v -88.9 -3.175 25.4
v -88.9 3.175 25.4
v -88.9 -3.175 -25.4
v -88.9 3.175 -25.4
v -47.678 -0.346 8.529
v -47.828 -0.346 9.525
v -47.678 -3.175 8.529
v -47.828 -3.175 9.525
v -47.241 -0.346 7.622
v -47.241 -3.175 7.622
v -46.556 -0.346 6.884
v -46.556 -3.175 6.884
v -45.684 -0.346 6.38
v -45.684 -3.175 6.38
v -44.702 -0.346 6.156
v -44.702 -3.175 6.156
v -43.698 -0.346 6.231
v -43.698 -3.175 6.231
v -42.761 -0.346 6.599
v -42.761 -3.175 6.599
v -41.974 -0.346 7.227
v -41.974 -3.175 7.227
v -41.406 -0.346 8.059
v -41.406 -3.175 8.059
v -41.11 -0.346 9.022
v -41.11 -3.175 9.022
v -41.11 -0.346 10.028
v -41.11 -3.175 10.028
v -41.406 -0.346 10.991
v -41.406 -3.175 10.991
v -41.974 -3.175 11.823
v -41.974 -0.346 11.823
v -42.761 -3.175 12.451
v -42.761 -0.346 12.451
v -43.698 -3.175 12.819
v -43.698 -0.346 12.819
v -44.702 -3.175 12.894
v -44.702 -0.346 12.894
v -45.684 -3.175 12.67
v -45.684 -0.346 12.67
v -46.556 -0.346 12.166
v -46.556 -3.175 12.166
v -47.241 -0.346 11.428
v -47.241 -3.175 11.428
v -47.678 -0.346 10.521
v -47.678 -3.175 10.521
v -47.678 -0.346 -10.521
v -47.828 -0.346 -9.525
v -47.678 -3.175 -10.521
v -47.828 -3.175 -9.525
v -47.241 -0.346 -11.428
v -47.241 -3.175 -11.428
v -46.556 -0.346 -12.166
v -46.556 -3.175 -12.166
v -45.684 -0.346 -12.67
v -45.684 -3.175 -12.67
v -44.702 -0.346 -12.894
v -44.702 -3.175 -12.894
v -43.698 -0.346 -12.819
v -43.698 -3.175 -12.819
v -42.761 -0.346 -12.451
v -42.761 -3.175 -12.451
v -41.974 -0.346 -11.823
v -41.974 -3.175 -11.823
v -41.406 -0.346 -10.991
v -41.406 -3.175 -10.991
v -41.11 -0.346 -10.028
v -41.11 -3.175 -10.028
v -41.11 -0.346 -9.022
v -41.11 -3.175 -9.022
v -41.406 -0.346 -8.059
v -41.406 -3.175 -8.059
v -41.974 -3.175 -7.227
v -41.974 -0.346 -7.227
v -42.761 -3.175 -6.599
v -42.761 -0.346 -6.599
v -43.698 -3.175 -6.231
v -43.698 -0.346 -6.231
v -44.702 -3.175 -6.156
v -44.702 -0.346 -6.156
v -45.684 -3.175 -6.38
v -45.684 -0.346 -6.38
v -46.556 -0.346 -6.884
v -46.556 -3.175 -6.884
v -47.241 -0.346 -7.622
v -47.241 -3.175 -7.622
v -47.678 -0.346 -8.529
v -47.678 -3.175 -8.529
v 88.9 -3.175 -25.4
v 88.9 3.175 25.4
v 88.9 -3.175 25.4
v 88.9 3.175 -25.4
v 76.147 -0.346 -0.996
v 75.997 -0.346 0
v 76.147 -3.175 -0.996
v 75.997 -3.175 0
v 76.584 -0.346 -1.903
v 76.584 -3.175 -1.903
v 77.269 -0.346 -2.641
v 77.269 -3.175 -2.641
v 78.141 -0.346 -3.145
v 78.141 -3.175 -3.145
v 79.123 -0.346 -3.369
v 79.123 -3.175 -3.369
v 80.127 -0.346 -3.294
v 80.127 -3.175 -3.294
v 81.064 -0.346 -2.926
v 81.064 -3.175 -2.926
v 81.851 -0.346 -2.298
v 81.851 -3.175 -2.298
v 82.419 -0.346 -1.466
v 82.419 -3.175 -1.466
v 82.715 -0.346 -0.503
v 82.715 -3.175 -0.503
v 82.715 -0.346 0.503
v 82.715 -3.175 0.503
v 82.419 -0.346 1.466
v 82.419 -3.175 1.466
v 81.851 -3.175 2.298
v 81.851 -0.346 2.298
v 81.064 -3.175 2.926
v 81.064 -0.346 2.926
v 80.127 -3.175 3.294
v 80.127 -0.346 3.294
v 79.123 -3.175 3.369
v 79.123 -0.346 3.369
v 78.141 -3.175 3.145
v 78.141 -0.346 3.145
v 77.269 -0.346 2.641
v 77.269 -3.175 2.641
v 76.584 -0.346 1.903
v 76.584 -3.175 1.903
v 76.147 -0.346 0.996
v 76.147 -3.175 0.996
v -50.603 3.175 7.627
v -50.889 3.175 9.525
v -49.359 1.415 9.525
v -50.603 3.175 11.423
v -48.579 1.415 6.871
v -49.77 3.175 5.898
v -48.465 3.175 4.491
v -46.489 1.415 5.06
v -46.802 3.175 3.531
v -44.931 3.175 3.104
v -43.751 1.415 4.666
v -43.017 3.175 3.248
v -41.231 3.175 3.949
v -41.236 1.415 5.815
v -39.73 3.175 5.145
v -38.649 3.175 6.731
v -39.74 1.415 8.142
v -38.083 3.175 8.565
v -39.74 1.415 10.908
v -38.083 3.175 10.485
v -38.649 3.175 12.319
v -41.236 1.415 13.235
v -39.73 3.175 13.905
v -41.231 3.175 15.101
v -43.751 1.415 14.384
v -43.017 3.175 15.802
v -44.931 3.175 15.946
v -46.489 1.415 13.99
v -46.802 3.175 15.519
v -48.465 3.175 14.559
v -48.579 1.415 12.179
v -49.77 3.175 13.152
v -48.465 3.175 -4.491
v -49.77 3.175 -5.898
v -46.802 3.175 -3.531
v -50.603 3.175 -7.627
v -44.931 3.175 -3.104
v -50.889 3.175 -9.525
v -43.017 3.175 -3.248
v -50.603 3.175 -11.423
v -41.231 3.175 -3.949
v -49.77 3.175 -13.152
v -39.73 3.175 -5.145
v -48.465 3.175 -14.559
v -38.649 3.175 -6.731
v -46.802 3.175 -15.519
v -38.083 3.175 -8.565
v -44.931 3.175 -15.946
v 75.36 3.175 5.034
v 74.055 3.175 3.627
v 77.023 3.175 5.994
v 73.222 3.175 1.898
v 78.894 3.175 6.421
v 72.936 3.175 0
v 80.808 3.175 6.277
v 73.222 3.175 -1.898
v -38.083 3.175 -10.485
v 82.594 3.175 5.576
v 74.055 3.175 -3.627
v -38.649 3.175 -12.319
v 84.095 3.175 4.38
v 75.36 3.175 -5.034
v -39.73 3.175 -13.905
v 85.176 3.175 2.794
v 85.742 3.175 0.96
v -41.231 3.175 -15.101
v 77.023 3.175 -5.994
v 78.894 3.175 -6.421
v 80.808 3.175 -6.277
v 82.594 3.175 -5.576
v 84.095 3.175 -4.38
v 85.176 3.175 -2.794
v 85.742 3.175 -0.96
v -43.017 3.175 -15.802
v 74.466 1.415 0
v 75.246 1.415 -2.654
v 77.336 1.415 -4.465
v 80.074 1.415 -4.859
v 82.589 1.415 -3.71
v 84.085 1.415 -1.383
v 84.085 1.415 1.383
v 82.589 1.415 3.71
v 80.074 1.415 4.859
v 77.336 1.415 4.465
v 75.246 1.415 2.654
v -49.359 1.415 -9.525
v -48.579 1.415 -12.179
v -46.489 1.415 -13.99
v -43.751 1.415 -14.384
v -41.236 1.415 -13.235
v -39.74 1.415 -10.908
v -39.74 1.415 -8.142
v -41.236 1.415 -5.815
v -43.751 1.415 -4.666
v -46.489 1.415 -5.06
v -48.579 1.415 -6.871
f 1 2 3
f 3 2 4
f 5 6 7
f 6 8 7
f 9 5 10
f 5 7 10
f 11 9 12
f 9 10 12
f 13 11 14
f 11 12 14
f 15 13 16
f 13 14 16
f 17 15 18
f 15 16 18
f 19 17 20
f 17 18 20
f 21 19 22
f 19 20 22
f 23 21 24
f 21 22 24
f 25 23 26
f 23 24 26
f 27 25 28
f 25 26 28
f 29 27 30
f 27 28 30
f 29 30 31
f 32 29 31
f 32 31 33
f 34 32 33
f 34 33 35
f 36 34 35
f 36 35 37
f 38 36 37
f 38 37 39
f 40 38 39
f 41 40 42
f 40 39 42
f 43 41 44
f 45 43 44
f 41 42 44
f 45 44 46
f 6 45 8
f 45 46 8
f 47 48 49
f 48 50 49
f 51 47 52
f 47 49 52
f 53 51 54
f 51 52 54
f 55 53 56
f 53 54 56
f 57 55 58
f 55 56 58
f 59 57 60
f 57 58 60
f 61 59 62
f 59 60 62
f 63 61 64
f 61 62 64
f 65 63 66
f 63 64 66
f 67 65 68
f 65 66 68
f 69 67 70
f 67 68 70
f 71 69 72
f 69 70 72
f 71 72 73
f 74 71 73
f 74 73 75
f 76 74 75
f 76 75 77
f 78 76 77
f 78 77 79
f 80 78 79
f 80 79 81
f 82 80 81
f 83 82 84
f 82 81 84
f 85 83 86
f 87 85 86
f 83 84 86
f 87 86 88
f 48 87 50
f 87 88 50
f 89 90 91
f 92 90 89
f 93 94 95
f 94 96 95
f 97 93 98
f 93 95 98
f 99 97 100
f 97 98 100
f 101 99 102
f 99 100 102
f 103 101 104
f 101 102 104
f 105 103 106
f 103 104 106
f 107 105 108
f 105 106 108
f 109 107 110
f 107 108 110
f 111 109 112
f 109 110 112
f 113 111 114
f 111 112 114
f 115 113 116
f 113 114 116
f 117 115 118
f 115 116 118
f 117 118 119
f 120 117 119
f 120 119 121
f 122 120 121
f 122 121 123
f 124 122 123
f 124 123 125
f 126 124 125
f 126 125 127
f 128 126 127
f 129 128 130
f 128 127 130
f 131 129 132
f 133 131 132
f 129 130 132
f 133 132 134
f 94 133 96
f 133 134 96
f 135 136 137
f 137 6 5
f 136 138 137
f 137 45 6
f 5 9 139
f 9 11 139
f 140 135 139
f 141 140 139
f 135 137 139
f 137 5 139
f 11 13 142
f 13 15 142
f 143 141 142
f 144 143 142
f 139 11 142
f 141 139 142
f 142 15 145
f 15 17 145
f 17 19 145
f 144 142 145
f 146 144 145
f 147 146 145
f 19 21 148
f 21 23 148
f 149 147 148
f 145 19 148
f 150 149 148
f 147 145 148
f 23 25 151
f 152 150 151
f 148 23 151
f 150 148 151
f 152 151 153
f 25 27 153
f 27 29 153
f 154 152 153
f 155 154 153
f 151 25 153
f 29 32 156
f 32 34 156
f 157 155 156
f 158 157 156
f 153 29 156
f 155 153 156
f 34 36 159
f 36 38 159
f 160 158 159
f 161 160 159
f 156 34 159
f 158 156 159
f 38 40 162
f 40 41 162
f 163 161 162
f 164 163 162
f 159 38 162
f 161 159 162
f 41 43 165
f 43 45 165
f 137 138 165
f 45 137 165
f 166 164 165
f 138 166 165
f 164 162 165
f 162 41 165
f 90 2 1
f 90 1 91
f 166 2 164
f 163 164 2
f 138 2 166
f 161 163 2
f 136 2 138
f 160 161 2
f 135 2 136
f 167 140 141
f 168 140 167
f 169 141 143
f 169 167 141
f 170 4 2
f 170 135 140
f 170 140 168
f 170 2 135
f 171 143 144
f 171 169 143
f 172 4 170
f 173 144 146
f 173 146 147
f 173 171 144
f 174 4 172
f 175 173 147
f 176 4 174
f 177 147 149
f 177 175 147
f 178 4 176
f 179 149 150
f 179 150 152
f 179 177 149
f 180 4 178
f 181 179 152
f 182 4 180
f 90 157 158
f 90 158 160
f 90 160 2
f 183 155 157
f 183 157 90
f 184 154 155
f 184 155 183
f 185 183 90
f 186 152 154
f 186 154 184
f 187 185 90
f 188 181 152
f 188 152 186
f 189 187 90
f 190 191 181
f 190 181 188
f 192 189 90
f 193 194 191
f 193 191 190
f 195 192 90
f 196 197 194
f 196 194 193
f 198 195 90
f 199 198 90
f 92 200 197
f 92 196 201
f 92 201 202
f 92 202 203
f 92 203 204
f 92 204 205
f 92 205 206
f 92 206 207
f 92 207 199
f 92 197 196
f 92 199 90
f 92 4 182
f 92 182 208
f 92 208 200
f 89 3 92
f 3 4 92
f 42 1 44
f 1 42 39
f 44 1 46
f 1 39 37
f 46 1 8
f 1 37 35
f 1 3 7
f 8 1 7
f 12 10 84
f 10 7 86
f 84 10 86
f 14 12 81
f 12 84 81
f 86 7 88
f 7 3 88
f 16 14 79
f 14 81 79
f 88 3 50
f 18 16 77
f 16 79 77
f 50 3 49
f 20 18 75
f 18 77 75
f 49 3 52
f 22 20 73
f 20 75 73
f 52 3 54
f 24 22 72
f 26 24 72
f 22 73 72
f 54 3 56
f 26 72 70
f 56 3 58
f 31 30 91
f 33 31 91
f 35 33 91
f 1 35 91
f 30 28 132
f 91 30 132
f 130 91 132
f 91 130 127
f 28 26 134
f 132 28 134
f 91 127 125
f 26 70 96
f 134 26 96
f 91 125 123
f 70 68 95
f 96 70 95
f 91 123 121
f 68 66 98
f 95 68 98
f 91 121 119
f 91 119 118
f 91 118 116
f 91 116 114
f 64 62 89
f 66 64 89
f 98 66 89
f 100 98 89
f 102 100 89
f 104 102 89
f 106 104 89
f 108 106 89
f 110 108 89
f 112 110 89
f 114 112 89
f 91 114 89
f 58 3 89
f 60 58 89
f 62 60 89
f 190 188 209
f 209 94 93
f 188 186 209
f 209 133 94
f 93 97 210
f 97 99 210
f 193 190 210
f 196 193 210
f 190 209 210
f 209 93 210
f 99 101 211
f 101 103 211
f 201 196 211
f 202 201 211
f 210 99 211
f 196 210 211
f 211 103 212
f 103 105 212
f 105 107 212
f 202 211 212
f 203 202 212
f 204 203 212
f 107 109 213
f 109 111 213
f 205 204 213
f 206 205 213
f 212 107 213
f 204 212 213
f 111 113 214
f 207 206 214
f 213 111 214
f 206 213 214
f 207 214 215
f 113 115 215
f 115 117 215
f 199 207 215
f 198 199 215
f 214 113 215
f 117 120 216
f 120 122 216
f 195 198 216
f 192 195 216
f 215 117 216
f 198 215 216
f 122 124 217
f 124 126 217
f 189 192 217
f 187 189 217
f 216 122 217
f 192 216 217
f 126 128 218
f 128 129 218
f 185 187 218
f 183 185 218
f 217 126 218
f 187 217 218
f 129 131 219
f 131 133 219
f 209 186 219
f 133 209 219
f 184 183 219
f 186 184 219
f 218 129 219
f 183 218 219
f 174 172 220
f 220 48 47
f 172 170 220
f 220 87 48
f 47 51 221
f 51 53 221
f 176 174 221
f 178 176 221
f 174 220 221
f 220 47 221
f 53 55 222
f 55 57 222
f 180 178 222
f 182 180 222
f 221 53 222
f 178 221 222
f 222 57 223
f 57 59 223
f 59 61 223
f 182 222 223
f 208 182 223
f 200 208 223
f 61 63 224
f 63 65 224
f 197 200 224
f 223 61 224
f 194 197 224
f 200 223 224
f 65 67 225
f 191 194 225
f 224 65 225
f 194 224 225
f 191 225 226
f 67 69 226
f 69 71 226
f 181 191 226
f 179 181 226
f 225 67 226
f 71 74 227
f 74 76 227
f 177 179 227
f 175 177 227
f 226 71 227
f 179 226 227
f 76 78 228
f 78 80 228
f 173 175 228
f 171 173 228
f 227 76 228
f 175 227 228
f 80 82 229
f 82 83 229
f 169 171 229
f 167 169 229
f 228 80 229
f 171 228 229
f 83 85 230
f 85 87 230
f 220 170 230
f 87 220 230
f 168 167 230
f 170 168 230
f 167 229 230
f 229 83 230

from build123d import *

# Parameters (mm, degrees)
SKETCH1_W                                        = 177.8
SKETCH1_H                                        = 50.8
BOSS_EXTRUDE1_DEPTH                              = 3.175
CSK_FOR_1_4_FLAT_HEAD_MACHINE_SCREW1_D           = 6.7564
CSK_FOR_1_4_FLAT_HEAD_MACHINE_SCREW1_DEPTH       = 19.05
CSK_FOR_1_4_FLAT_HEAD_MACHINE_SCREW1_CSINK_D     = 12.8778
CSK_FOR_1_4_FLAT_HEAD_MACHINE_SCREW1_CSINK_ANGLE = 82
CSK_FOR_1_4_FLAT_HEAD_MACHINE_SCREW1_TIP         = 2.029827343


with BuildPart() as part:
    # Sketch1 → Boss-Extrude1 (new, symmetric)
    with BuildSketch(Plane(origin=(0, 0, 0), x_dir=(1, 0, 0), z_dir=(0, 1, 0))):
        Rectangle(SKETCH1_W, SKETCH1_H)
    extrude(amount=BOSS_EXTRUDE1_DEPTH, both=True)

    # CSK for 1/4 Flat Head Machine Screw1
    with Locations(Plane(origin=(0, 3.175, 0), x_dir=(1, 0, 0), z_dir=(0, 1, 0))):
        with Locations((79.375, 0), (-44.45, 9.525), (-44.45, -9.525)):
            CounterSinkHole(CSK_FOR_1_4_FLAT_HEAD_MACHINE_SCREW1_D / 2, CSK_FOR_1_4_FLAT_HEAD_MACHINE_SCREW1_CSINK_D / 2, depth=CSK_FOR_1_4_FLAT_HEAD_MACHINE_SCREW1_DEPTH, counter_sink_angle=CSK_FOR_1_4_FLAT_HEAD_MACHINE_SCREW1_CSINK_ANGLE)
            with Locations((0, 0, -(CSK_FOR_1_4_FLAT_HEAD_MACHINE_SCREW1_DEPTH + CSK_FOR_1_4_FLAT_HEAD_MACHINE_SCREW1_TIP / 2))):  # 118° drill point
                Cone(0, CSK_FOR_1_4_FLAT_HEAD_MACHINE_SCREW1_D / 2, CSK_FOR_1_4_FLAT_HEAD_MACHINE_SCREW1_TIP, mode=Mode.SUBTRACT)


solid = part.part
